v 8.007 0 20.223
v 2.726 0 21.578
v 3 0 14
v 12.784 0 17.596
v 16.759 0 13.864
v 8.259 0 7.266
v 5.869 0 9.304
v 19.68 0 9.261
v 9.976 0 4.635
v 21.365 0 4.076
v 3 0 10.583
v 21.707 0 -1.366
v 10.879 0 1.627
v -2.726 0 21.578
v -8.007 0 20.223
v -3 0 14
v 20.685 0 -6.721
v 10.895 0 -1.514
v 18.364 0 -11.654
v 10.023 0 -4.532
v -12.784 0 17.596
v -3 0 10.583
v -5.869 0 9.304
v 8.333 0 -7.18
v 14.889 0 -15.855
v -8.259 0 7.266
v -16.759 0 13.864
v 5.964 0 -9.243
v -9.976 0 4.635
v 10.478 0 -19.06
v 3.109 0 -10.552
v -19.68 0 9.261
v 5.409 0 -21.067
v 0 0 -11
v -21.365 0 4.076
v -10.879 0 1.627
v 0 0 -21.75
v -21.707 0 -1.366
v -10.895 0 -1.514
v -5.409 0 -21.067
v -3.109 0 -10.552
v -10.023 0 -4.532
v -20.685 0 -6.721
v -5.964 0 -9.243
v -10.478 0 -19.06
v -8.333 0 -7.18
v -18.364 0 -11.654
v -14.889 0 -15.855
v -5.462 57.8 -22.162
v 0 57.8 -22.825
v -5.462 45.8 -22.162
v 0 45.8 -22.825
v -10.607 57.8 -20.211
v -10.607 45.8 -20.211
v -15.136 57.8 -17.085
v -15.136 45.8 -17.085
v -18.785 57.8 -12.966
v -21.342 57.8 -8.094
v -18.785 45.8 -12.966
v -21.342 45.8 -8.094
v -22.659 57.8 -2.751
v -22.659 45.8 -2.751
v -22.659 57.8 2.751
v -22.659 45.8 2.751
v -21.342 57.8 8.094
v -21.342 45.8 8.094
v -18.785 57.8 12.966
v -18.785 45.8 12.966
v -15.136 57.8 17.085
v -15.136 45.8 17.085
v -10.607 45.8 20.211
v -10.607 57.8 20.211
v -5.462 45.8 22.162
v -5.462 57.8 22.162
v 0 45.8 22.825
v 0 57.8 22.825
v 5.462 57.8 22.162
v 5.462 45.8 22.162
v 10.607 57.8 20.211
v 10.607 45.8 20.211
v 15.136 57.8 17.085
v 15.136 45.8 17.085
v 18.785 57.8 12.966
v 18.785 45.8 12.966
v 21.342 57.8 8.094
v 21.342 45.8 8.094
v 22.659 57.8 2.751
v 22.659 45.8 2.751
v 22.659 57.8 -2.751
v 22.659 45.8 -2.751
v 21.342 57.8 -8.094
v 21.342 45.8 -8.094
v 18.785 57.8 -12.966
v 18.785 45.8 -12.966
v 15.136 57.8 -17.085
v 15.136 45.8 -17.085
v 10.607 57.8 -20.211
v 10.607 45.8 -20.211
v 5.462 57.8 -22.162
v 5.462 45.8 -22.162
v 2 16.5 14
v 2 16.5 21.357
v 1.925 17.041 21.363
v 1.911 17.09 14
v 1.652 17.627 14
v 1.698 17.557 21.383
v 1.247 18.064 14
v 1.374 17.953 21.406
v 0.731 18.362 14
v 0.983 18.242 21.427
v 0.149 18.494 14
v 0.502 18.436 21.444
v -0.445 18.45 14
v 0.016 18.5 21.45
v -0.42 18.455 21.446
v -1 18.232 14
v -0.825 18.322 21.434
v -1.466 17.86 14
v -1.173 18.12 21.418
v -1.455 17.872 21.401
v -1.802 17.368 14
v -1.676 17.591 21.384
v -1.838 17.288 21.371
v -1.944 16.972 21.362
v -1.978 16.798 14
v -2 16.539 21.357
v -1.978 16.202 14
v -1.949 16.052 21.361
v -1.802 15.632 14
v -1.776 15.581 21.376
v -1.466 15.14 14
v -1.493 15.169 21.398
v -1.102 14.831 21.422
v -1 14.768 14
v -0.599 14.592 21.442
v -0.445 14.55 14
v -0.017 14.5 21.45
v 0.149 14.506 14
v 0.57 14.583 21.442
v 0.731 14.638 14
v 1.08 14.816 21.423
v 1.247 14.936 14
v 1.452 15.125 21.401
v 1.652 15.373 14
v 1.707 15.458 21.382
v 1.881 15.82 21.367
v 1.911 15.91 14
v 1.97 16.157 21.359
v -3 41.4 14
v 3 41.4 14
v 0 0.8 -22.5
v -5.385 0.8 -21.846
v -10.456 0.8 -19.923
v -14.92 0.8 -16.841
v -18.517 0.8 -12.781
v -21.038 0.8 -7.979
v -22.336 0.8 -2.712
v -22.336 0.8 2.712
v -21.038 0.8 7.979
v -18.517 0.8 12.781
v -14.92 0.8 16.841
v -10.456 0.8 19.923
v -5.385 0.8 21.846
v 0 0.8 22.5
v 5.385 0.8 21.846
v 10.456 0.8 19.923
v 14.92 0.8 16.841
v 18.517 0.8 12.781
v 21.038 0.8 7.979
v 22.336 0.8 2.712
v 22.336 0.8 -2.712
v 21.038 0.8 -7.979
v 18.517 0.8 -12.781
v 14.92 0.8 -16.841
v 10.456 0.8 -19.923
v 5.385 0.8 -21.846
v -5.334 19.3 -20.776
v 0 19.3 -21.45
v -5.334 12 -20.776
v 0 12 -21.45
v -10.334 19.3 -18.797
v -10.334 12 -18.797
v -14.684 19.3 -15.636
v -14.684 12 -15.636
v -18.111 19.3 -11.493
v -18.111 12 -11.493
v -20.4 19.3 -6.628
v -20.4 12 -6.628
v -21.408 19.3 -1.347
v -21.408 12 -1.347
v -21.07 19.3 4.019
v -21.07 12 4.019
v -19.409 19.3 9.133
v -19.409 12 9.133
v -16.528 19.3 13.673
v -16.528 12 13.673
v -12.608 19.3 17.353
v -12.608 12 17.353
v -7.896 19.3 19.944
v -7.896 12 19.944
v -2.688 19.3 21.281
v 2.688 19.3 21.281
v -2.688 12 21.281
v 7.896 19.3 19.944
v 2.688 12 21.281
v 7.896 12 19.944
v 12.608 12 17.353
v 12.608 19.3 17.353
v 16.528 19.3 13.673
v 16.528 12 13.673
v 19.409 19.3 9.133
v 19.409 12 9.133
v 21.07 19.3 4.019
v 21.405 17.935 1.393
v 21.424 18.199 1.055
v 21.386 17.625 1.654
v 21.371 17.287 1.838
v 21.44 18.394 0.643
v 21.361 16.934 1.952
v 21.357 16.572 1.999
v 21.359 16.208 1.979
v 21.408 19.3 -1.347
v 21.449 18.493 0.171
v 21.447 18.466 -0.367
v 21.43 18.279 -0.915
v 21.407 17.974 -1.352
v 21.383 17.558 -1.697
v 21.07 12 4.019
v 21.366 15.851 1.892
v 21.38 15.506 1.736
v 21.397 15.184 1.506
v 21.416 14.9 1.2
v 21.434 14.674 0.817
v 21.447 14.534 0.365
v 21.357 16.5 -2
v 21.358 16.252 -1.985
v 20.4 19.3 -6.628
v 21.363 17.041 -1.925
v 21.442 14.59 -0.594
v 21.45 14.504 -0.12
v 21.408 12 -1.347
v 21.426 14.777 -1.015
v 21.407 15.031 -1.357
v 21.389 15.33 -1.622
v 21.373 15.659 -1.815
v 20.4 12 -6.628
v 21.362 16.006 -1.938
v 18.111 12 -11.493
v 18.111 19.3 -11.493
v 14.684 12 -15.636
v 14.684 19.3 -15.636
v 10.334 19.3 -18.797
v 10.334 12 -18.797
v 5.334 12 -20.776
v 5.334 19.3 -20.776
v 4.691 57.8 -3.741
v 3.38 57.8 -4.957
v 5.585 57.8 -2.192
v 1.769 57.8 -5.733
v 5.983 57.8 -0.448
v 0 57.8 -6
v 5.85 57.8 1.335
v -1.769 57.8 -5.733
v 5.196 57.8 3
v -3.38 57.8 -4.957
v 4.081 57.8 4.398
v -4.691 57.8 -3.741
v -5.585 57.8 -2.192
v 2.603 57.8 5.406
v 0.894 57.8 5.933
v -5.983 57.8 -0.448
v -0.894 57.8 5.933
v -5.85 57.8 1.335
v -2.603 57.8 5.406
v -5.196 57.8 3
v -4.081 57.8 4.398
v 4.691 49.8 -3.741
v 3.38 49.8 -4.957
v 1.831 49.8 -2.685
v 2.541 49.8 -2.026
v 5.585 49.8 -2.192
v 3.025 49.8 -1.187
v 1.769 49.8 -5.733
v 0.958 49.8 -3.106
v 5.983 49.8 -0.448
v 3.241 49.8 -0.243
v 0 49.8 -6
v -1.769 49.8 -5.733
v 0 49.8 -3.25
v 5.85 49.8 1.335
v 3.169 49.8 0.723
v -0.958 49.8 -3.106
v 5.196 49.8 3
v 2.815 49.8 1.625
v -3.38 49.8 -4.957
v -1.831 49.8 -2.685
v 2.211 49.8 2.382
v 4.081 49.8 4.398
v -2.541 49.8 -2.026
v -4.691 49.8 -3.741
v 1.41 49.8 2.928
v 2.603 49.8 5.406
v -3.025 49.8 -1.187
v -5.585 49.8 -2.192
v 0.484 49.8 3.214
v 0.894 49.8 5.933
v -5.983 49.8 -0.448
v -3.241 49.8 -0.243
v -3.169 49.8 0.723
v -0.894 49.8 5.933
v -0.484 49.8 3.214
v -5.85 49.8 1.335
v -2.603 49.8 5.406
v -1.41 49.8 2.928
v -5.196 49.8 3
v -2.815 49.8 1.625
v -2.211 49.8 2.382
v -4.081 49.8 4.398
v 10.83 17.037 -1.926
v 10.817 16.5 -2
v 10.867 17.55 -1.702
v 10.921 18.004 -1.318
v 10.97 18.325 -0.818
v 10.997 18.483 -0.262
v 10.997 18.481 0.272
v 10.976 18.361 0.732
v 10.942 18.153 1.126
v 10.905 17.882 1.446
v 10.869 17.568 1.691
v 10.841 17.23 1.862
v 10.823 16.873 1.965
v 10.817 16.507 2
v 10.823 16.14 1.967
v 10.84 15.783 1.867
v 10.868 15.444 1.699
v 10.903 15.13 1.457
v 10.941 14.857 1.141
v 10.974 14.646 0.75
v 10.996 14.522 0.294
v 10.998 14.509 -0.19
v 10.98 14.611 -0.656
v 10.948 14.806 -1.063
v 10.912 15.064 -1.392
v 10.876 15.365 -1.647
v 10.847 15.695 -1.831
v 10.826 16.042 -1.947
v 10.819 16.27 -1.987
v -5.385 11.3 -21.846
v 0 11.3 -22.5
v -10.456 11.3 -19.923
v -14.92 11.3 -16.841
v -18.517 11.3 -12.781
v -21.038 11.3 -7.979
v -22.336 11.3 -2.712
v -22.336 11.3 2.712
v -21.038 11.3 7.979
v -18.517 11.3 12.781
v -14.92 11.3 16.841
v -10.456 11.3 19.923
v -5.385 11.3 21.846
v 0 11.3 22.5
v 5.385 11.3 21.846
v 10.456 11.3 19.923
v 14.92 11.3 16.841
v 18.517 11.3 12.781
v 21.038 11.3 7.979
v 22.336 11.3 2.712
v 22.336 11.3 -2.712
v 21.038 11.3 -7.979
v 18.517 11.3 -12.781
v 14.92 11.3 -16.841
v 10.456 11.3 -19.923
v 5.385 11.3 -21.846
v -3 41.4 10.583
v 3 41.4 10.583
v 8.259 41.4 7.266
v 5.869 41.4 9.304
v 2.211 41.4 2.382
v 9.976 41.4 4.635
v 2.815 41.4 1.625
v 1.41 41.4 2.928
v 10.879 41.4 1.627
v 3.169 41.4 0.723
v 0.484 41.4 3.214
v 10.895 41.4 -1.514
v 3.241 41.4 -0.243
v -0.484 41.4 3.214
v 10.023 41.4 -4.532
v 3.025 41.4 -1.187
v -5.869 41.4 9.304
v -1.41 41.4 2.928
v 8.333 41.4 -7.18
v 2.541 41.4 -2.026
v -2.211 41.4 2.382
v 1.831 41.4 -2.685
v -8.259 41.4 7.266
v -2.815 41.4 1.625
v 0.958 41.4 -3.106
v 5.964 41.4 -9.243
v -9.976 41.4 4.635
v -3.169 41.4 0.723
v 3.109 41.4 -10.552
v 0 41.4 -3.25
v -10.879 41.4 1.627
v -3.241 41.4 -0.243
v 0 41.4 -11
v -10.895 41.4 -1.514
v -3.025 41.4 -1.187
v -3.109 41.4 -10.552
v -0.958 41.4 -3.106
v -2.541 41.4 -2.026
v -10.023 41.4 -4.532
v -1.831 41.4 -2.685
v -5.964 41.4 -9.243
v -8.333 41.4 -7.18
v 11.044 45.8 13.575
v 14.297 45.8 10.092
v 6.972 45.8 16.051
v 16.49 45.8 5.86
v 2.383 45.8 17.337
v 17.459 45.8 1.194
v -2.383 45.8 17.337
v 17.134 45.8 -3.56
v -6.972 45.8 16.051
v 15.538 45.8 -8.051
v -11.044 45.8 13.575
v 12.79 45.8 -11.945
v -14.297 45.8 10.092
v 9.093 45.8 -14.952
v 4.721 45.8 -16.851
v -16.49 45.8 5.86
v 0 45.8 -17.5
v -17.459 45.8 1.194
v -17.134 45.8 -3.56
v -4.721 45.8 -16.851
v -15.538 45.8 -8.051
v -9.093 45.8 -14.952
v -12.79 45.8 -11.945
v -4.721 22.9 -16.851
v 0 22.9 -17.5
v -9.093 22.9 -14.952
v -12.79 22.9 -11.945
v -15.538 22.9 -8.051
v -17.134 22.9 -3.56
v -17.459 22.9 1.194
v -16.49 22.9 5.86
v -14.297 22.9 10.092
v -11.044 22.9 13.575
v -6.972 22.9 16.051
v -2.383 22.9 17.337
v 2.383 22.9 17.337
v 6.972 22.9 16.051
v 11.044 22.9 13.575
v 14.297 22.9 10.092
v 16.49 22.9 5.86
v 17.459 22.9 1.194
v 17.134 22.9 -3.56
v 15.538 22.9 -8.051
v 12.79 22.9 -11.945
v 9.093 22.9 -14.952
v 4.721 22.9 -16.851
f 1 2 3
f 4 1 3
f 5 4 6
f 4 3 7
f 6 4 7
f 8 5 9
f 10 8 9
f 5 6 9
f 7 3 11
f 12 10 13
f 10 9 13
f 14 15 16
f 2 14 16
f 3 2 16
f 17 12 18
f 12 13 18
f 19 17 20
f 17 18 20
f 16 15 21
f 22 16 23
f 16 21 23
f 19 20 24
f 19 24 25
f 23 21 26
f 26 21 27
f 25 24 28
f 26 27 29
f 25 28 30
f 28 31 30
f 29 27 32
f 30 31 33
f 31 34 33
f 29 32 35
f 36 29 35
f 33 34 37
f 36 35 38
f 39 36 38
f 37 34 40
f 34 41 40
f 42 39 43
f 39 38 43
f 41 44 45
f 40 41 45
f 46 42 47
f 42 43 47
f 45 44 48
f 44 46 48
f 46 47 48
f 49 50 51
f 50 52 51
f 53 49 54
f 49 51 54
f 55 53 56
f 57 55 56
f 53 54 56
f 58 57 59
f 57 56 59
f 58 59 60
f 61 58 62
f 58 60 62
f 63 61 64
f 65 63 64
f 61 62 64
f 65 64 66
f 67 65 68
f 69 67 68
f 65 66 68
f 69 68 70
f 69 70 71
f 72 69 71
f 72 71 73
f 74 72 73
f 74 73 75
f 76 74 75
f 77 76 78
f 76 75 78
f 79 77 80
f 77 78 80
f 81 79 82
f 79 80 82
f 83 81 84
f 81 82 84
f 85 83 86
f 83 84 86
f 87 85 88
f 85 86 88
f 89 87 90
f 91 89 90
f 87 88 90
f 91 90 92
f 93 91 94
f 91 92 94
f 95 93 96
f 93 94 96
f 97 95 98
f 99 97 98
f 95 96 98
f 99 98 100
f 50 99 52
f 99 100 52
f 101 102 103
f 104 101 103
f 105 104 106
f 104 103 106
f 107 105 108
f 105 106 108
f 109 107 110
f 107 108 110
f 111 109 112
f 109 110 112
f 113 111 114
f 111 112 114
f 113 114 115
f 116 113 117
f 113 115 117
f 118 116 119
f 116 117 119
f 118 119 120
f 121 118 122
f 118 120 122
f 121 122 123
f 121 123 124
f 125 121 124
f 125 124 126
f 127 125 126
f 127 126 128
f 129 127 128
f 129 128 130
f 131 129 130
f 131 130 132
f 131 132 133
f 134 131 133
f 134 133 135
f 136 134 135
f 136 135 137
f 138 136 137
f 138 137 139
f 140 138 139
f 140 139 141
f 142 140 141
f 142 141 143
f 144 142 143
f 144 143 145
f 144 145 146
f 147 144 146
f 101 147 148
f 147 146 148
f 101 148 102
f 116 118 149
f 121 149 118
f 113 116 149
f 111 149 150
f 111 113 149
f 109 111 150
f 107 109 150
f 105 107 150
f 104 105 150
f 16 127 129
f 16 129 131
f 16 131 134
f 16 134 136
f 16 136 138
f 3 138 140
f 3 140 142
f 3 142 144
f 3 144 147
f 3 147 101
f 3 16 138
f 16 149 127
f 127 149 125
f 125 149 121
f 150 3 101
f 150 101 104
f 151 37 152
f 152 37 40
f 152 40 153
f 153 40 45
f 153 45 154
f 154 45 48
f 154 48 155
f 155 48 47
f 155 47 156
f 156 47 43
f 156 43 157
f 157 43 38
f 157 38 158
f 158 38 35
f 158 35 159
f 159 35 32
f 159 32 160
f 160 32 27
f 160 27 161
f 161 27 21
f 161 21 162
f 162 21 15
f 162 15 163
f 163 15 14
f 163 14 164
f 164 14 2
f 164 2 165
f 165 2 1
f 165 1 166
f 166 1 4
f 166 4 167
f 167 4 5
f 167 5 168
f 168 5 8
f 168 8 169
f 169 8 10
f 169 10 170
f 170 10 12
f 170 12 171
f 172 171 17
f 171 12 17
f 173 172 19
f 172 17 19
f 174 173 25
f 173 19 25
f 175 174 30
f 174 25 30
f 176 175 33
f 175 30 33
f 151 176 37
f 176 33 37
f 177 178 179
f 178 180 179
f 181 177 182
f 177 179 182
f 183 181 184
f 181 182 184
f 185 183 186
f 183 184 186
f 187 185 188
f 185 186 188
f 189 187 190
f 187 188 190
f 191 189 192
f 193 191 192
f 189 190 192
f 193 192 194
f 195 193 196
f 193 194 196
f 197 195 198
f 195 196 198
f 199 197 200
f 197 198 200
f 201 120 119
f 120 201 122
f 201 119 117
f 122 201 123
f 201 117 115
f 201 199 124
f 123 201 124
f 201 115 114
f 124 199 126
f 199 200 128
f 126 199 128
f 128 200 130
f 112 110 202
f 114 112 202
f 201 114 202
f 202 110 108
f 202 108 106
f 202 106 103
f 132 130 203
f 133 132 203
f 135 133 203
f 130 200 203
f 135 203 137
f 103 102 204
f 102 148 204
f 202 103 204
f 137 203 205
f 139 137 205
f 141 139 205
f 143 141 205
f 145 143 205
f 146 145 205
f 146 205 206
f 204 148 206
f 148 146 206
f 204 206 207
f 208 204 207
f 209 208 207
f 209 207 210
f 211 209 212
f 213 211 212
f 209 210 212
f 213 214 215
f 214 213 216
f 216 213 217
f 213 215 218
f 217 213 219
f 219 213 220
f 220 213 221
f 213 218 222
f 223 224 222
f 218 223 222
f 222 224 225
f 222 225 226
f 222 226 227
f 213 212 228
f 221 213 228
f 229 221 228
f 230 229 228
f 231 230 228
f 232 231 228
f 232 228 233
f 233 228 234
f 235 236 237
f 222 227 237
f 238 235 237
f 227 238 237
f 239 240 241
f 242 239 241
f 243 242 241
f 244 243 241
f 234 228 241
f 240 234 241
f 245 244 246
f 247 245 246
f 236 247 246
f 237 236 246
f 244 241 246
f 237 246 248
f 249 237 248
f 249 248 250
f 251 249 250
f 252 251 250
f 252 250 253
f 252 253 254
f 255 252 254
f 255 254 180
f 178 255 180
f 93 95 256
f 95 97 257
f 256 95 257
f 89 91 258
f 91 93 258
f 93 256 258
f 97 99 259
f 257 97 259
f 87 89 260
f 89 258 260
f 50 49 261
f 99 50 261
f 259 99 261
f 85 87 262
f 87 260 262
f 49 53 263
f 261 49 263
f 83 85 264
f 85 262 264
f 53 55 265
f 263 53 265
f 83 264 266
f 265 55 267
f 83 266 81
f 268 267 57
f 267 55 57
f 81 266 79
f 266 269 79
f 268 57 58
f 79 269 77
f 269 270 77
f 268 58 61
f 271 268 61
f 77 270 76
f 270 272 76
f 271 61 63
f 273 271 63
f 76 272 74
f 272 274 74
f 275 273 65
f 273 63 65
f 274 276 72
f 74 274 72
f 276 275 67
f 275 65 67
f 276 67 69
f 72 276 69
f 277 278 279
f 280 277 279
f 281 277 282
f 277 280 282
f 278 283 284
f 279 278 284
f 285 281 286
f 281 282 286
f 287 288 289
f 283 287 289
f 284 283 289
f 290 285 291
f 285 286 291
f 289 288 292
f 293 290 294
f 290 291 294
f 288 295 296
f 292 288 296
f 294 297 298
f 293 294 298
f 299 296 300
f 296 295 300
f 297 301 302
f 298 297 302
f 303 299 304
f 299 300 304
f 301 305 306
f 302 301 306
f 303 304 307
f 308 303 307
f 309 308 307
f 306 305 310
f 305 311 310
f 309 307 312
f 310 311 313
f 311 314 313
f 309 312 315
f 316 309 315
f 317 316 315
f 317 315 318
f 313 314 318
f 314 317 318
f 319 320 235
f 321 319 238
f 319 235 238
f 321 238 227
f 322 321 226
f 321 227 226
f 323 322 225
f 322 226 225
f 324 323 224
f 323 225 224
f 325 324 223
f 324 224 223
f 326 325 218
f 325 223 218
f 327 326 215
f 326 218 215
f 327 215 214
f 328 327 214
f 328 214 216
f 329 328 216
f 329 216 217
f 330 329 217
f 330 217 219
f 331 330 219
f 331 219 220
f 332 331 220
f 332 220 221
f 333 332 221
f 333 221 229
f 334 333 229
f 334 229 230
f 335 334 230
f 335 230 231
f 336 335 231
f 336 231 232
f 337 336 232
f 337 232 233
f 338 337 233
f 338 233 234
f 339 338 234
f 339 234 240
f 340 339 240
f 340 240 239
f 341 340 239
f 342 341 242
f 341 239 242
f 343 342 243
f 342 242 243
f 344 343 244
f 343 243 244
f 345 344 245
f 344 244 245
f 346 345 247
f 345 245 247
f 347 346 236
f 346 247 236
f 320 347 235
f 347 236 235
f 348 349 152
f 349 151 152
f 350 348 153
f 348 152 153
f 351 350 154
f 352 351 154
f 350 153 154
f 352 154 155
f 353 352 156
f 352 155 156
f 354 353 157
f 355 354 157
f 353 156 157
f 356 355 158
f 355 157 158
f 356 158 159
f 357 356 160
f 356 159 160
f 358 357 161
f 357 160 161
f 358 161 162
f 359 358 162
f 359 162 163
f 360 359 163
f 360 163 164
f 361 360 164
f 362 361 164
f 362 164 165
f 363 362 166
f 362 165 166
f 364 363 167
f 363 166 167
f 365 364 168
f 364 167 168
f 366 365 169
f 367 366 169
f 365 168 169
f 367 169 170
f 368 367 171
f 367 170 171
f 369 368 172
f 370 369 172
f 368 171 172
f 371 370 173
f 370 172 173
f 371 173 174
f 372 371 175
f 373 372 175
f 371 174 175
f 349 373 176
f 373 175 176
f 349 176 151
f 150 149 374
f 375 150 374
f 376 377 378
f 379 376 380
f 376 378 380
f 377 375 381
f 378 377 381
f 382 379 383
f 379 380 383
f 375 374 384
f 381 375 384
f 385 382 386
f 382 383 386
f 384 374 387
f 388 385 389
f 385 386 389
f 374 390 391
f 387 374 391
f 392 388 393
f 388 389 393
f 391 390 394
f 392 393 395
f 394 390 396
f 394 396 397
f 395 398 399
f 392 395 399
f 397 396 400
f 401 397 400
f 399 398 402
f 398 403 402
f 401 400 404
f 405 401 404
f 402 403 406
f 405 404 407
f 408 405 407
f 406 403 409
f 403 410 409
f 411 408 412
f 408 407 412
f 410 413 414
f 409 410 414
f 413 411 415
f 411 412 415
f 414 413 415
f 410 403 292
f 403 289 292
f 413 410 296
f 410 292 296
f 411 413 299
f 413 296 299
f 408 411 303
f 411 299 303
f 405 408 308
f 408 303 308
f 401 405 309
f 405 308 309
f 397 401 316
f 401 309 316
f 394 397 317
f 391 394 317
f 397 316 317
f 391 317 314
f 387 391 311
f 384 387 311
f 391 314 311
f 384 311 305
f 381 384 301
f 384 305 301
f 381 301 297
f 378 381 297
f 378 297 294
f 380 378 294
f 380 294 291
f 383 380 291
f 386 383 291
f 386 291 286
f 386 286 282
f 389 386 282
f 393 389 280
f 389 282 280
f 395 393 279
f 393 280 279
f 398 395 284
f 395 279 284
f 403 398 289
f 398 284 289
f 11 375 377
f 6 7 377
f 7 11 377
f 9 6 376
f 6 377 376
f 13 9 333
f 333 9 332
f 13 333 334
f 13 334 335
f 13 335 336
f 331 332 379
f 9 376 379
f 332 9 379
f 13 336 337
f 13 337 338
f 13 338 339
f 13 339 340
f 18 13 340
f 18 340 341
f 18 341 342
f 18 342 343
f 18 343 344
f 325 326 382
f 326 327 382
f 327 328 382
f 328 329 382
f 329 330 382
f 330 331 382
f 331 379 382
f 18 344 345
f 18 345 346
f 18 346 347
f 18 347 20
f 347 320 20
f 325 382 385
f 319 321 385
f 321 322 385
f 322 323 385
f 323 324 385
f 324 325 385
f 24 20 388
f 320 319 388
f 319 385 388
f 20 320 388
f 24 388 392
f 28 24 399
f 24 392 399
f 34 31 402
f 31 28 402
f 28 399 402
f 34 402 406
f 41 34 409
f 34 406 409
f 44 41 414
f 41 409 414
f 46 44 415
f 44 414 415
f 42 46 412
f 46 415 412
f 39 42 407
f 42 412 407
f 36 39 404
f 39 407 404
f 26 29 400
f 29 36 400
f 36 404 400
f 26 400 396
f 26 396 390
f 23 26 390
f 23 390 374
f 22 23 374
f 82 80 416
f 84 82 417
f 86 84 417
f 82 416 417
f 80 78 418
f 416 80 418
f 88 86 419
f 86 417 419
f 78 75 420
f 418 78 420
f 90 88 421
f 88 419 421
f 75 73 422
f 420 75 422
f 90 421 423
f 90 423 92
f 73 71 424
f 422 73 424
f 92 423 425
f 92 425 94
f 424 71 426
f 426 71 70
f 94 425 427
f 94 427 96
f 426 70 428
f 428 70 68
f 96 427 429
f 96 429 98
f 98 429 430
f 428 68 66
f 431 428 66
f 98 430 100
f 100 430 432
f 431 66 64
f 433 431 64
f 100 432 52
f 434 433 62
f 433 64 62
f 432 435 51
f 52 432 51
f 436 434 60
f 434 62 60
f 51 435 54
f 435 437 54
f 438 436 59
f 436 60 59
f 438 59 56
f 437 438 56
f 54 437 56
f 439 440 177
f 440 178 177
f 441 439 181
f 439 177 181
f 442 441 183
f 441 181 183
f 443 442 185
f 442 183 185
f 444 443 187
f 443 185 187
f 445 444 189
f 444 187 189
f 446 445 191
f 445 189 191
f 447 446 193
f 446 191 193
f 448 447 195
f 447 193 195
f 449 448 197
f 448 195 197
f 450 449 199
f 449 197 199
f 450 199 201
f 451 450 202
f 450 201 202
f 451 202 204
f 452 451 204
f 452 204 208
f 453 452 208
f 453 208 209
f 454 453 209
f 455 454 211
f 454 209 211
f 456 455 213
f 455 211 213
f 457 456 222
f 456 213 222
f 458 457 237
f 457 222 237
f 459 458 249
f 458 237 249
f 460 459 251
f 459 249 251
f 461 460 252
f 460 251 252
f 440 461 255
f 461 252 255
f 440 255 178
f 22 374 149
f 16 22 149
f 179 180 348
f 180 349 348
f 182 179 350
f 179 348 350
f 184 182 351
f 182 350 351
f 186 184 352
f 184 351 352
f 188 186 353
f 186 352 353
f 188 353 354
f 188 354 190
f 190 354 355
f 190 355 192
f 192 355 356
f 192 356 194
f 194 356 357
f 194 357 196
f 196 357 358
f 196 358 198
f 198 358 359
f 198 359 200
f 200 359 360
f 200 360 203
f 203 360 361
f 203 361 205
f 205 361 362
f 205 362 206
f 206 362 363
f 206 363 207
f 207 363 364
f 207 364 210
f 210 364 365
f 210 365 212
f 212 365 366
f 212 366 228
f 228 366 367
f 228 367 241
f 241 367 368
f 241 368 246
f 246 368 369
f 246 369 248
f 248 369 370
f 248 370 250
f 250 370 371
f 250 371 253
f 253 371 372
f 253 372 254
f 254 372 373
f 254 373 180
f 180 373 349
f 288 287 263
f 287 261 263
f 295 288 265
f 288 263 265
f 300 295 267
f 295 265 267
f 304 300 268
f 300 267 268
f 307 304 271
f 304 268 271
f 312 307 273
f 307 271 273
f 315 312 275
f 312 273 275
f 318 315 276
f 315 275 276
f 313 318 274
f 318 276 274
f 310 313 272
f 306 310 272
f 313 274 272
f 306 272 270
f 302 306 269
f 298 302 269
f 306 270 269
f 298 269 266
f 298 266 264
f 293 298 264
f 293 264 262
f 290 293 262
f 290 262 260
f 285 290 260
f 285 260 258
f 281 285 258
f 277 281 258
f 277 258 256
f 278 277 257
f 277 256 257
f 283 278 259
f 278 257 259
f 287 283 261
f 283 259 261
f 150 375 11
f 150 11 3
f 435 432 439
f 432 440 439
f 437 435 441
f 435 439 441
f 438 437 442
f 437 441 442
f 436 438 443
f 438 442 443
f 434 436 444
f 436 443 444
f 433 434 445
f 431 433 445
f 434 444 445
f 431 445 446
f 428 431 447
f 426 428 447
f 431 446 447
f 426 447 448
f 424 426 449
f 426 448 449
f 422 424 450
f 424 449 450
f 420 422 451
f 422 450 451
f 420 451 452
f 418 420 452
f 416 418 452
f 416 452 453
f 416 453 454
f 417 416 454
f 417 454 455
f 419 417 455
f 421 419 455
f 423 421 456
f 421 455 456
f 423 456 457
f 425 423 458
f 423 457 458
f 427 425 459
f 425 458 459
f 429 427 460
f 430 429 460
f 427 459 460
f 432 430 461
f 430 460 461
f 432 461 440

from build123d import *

# Parameters (mm, degrees)
SKETCH2_W          = 6
SKETCH2_H          = 7
CUT_EXTRUDE1_DEPTH = 41.4
SKETCH3_R          = 2
CUT_EXTRUDE2_DEPTH = 29
SKETCH4_R          = 2
CUT_EXTRUDE3_DEPTH = 29


with BuildPart() as part:
    # Sketch1 → Revolve1 (revolve)
    with BuildSketch(Plane.XY, mode=Mode.PRIVATE) as revolve1_sk:
        Polygon((11, 0), (11, 41.4), (3.25, 41.4), (3.25, 49.8), (6, 49.8), (6, 57.8), (22.825, 57.8), (22.825, 45.8), (17.5, 45.8), (17.5, 22.9), (21.45, 19.3), (21.45, 12), (22.5, 11.3), (22.5, 0.8), (21.75, 0), align=None)
    revolve(revolve1_sk.sketch.rotate(Axis((0, 0, 0), (0, 1, 0)), 90), axis=Axis((0, 0, 0), (0, 1, 0)))

    # Sketch2 → Cut-Extrude1 (cut)
    with BuildSketch(Plane.XZ):
        with Locations((0, 10.5)):
            Rectangle(SKETCH2_W, SKETCH2_H)
    extrude(amount=-CUT_EXTRUDE1_DEPTH, mode=Mode.SUBTRACT)

    # Sketch3 → Cut-Extrude2 (cut)
    with BuildSketch(Plane.XY.offset(22)):
        with Locations((0, 16.5)):
            Circle(SKETCH3_R)
    extrude(amount=-CUT_EXTRUDE2_DEPTH, mode=Mode.SUBTRACT)

    # Sketch4 → Cut-Extrude3 (cut)
    with BuildSketch(Plane(origin=(22, 0, 0), x_dir=(0, 0, -1), z_dir=(1, 0, 0))):
        with Locations((0, 16.5)):
            Circle(SKETCH4_R)
    extrude(amount=-CUT_EXTRUDE3_DEPTH, mode=Mode.SUBTRACT)


solid = part.part
